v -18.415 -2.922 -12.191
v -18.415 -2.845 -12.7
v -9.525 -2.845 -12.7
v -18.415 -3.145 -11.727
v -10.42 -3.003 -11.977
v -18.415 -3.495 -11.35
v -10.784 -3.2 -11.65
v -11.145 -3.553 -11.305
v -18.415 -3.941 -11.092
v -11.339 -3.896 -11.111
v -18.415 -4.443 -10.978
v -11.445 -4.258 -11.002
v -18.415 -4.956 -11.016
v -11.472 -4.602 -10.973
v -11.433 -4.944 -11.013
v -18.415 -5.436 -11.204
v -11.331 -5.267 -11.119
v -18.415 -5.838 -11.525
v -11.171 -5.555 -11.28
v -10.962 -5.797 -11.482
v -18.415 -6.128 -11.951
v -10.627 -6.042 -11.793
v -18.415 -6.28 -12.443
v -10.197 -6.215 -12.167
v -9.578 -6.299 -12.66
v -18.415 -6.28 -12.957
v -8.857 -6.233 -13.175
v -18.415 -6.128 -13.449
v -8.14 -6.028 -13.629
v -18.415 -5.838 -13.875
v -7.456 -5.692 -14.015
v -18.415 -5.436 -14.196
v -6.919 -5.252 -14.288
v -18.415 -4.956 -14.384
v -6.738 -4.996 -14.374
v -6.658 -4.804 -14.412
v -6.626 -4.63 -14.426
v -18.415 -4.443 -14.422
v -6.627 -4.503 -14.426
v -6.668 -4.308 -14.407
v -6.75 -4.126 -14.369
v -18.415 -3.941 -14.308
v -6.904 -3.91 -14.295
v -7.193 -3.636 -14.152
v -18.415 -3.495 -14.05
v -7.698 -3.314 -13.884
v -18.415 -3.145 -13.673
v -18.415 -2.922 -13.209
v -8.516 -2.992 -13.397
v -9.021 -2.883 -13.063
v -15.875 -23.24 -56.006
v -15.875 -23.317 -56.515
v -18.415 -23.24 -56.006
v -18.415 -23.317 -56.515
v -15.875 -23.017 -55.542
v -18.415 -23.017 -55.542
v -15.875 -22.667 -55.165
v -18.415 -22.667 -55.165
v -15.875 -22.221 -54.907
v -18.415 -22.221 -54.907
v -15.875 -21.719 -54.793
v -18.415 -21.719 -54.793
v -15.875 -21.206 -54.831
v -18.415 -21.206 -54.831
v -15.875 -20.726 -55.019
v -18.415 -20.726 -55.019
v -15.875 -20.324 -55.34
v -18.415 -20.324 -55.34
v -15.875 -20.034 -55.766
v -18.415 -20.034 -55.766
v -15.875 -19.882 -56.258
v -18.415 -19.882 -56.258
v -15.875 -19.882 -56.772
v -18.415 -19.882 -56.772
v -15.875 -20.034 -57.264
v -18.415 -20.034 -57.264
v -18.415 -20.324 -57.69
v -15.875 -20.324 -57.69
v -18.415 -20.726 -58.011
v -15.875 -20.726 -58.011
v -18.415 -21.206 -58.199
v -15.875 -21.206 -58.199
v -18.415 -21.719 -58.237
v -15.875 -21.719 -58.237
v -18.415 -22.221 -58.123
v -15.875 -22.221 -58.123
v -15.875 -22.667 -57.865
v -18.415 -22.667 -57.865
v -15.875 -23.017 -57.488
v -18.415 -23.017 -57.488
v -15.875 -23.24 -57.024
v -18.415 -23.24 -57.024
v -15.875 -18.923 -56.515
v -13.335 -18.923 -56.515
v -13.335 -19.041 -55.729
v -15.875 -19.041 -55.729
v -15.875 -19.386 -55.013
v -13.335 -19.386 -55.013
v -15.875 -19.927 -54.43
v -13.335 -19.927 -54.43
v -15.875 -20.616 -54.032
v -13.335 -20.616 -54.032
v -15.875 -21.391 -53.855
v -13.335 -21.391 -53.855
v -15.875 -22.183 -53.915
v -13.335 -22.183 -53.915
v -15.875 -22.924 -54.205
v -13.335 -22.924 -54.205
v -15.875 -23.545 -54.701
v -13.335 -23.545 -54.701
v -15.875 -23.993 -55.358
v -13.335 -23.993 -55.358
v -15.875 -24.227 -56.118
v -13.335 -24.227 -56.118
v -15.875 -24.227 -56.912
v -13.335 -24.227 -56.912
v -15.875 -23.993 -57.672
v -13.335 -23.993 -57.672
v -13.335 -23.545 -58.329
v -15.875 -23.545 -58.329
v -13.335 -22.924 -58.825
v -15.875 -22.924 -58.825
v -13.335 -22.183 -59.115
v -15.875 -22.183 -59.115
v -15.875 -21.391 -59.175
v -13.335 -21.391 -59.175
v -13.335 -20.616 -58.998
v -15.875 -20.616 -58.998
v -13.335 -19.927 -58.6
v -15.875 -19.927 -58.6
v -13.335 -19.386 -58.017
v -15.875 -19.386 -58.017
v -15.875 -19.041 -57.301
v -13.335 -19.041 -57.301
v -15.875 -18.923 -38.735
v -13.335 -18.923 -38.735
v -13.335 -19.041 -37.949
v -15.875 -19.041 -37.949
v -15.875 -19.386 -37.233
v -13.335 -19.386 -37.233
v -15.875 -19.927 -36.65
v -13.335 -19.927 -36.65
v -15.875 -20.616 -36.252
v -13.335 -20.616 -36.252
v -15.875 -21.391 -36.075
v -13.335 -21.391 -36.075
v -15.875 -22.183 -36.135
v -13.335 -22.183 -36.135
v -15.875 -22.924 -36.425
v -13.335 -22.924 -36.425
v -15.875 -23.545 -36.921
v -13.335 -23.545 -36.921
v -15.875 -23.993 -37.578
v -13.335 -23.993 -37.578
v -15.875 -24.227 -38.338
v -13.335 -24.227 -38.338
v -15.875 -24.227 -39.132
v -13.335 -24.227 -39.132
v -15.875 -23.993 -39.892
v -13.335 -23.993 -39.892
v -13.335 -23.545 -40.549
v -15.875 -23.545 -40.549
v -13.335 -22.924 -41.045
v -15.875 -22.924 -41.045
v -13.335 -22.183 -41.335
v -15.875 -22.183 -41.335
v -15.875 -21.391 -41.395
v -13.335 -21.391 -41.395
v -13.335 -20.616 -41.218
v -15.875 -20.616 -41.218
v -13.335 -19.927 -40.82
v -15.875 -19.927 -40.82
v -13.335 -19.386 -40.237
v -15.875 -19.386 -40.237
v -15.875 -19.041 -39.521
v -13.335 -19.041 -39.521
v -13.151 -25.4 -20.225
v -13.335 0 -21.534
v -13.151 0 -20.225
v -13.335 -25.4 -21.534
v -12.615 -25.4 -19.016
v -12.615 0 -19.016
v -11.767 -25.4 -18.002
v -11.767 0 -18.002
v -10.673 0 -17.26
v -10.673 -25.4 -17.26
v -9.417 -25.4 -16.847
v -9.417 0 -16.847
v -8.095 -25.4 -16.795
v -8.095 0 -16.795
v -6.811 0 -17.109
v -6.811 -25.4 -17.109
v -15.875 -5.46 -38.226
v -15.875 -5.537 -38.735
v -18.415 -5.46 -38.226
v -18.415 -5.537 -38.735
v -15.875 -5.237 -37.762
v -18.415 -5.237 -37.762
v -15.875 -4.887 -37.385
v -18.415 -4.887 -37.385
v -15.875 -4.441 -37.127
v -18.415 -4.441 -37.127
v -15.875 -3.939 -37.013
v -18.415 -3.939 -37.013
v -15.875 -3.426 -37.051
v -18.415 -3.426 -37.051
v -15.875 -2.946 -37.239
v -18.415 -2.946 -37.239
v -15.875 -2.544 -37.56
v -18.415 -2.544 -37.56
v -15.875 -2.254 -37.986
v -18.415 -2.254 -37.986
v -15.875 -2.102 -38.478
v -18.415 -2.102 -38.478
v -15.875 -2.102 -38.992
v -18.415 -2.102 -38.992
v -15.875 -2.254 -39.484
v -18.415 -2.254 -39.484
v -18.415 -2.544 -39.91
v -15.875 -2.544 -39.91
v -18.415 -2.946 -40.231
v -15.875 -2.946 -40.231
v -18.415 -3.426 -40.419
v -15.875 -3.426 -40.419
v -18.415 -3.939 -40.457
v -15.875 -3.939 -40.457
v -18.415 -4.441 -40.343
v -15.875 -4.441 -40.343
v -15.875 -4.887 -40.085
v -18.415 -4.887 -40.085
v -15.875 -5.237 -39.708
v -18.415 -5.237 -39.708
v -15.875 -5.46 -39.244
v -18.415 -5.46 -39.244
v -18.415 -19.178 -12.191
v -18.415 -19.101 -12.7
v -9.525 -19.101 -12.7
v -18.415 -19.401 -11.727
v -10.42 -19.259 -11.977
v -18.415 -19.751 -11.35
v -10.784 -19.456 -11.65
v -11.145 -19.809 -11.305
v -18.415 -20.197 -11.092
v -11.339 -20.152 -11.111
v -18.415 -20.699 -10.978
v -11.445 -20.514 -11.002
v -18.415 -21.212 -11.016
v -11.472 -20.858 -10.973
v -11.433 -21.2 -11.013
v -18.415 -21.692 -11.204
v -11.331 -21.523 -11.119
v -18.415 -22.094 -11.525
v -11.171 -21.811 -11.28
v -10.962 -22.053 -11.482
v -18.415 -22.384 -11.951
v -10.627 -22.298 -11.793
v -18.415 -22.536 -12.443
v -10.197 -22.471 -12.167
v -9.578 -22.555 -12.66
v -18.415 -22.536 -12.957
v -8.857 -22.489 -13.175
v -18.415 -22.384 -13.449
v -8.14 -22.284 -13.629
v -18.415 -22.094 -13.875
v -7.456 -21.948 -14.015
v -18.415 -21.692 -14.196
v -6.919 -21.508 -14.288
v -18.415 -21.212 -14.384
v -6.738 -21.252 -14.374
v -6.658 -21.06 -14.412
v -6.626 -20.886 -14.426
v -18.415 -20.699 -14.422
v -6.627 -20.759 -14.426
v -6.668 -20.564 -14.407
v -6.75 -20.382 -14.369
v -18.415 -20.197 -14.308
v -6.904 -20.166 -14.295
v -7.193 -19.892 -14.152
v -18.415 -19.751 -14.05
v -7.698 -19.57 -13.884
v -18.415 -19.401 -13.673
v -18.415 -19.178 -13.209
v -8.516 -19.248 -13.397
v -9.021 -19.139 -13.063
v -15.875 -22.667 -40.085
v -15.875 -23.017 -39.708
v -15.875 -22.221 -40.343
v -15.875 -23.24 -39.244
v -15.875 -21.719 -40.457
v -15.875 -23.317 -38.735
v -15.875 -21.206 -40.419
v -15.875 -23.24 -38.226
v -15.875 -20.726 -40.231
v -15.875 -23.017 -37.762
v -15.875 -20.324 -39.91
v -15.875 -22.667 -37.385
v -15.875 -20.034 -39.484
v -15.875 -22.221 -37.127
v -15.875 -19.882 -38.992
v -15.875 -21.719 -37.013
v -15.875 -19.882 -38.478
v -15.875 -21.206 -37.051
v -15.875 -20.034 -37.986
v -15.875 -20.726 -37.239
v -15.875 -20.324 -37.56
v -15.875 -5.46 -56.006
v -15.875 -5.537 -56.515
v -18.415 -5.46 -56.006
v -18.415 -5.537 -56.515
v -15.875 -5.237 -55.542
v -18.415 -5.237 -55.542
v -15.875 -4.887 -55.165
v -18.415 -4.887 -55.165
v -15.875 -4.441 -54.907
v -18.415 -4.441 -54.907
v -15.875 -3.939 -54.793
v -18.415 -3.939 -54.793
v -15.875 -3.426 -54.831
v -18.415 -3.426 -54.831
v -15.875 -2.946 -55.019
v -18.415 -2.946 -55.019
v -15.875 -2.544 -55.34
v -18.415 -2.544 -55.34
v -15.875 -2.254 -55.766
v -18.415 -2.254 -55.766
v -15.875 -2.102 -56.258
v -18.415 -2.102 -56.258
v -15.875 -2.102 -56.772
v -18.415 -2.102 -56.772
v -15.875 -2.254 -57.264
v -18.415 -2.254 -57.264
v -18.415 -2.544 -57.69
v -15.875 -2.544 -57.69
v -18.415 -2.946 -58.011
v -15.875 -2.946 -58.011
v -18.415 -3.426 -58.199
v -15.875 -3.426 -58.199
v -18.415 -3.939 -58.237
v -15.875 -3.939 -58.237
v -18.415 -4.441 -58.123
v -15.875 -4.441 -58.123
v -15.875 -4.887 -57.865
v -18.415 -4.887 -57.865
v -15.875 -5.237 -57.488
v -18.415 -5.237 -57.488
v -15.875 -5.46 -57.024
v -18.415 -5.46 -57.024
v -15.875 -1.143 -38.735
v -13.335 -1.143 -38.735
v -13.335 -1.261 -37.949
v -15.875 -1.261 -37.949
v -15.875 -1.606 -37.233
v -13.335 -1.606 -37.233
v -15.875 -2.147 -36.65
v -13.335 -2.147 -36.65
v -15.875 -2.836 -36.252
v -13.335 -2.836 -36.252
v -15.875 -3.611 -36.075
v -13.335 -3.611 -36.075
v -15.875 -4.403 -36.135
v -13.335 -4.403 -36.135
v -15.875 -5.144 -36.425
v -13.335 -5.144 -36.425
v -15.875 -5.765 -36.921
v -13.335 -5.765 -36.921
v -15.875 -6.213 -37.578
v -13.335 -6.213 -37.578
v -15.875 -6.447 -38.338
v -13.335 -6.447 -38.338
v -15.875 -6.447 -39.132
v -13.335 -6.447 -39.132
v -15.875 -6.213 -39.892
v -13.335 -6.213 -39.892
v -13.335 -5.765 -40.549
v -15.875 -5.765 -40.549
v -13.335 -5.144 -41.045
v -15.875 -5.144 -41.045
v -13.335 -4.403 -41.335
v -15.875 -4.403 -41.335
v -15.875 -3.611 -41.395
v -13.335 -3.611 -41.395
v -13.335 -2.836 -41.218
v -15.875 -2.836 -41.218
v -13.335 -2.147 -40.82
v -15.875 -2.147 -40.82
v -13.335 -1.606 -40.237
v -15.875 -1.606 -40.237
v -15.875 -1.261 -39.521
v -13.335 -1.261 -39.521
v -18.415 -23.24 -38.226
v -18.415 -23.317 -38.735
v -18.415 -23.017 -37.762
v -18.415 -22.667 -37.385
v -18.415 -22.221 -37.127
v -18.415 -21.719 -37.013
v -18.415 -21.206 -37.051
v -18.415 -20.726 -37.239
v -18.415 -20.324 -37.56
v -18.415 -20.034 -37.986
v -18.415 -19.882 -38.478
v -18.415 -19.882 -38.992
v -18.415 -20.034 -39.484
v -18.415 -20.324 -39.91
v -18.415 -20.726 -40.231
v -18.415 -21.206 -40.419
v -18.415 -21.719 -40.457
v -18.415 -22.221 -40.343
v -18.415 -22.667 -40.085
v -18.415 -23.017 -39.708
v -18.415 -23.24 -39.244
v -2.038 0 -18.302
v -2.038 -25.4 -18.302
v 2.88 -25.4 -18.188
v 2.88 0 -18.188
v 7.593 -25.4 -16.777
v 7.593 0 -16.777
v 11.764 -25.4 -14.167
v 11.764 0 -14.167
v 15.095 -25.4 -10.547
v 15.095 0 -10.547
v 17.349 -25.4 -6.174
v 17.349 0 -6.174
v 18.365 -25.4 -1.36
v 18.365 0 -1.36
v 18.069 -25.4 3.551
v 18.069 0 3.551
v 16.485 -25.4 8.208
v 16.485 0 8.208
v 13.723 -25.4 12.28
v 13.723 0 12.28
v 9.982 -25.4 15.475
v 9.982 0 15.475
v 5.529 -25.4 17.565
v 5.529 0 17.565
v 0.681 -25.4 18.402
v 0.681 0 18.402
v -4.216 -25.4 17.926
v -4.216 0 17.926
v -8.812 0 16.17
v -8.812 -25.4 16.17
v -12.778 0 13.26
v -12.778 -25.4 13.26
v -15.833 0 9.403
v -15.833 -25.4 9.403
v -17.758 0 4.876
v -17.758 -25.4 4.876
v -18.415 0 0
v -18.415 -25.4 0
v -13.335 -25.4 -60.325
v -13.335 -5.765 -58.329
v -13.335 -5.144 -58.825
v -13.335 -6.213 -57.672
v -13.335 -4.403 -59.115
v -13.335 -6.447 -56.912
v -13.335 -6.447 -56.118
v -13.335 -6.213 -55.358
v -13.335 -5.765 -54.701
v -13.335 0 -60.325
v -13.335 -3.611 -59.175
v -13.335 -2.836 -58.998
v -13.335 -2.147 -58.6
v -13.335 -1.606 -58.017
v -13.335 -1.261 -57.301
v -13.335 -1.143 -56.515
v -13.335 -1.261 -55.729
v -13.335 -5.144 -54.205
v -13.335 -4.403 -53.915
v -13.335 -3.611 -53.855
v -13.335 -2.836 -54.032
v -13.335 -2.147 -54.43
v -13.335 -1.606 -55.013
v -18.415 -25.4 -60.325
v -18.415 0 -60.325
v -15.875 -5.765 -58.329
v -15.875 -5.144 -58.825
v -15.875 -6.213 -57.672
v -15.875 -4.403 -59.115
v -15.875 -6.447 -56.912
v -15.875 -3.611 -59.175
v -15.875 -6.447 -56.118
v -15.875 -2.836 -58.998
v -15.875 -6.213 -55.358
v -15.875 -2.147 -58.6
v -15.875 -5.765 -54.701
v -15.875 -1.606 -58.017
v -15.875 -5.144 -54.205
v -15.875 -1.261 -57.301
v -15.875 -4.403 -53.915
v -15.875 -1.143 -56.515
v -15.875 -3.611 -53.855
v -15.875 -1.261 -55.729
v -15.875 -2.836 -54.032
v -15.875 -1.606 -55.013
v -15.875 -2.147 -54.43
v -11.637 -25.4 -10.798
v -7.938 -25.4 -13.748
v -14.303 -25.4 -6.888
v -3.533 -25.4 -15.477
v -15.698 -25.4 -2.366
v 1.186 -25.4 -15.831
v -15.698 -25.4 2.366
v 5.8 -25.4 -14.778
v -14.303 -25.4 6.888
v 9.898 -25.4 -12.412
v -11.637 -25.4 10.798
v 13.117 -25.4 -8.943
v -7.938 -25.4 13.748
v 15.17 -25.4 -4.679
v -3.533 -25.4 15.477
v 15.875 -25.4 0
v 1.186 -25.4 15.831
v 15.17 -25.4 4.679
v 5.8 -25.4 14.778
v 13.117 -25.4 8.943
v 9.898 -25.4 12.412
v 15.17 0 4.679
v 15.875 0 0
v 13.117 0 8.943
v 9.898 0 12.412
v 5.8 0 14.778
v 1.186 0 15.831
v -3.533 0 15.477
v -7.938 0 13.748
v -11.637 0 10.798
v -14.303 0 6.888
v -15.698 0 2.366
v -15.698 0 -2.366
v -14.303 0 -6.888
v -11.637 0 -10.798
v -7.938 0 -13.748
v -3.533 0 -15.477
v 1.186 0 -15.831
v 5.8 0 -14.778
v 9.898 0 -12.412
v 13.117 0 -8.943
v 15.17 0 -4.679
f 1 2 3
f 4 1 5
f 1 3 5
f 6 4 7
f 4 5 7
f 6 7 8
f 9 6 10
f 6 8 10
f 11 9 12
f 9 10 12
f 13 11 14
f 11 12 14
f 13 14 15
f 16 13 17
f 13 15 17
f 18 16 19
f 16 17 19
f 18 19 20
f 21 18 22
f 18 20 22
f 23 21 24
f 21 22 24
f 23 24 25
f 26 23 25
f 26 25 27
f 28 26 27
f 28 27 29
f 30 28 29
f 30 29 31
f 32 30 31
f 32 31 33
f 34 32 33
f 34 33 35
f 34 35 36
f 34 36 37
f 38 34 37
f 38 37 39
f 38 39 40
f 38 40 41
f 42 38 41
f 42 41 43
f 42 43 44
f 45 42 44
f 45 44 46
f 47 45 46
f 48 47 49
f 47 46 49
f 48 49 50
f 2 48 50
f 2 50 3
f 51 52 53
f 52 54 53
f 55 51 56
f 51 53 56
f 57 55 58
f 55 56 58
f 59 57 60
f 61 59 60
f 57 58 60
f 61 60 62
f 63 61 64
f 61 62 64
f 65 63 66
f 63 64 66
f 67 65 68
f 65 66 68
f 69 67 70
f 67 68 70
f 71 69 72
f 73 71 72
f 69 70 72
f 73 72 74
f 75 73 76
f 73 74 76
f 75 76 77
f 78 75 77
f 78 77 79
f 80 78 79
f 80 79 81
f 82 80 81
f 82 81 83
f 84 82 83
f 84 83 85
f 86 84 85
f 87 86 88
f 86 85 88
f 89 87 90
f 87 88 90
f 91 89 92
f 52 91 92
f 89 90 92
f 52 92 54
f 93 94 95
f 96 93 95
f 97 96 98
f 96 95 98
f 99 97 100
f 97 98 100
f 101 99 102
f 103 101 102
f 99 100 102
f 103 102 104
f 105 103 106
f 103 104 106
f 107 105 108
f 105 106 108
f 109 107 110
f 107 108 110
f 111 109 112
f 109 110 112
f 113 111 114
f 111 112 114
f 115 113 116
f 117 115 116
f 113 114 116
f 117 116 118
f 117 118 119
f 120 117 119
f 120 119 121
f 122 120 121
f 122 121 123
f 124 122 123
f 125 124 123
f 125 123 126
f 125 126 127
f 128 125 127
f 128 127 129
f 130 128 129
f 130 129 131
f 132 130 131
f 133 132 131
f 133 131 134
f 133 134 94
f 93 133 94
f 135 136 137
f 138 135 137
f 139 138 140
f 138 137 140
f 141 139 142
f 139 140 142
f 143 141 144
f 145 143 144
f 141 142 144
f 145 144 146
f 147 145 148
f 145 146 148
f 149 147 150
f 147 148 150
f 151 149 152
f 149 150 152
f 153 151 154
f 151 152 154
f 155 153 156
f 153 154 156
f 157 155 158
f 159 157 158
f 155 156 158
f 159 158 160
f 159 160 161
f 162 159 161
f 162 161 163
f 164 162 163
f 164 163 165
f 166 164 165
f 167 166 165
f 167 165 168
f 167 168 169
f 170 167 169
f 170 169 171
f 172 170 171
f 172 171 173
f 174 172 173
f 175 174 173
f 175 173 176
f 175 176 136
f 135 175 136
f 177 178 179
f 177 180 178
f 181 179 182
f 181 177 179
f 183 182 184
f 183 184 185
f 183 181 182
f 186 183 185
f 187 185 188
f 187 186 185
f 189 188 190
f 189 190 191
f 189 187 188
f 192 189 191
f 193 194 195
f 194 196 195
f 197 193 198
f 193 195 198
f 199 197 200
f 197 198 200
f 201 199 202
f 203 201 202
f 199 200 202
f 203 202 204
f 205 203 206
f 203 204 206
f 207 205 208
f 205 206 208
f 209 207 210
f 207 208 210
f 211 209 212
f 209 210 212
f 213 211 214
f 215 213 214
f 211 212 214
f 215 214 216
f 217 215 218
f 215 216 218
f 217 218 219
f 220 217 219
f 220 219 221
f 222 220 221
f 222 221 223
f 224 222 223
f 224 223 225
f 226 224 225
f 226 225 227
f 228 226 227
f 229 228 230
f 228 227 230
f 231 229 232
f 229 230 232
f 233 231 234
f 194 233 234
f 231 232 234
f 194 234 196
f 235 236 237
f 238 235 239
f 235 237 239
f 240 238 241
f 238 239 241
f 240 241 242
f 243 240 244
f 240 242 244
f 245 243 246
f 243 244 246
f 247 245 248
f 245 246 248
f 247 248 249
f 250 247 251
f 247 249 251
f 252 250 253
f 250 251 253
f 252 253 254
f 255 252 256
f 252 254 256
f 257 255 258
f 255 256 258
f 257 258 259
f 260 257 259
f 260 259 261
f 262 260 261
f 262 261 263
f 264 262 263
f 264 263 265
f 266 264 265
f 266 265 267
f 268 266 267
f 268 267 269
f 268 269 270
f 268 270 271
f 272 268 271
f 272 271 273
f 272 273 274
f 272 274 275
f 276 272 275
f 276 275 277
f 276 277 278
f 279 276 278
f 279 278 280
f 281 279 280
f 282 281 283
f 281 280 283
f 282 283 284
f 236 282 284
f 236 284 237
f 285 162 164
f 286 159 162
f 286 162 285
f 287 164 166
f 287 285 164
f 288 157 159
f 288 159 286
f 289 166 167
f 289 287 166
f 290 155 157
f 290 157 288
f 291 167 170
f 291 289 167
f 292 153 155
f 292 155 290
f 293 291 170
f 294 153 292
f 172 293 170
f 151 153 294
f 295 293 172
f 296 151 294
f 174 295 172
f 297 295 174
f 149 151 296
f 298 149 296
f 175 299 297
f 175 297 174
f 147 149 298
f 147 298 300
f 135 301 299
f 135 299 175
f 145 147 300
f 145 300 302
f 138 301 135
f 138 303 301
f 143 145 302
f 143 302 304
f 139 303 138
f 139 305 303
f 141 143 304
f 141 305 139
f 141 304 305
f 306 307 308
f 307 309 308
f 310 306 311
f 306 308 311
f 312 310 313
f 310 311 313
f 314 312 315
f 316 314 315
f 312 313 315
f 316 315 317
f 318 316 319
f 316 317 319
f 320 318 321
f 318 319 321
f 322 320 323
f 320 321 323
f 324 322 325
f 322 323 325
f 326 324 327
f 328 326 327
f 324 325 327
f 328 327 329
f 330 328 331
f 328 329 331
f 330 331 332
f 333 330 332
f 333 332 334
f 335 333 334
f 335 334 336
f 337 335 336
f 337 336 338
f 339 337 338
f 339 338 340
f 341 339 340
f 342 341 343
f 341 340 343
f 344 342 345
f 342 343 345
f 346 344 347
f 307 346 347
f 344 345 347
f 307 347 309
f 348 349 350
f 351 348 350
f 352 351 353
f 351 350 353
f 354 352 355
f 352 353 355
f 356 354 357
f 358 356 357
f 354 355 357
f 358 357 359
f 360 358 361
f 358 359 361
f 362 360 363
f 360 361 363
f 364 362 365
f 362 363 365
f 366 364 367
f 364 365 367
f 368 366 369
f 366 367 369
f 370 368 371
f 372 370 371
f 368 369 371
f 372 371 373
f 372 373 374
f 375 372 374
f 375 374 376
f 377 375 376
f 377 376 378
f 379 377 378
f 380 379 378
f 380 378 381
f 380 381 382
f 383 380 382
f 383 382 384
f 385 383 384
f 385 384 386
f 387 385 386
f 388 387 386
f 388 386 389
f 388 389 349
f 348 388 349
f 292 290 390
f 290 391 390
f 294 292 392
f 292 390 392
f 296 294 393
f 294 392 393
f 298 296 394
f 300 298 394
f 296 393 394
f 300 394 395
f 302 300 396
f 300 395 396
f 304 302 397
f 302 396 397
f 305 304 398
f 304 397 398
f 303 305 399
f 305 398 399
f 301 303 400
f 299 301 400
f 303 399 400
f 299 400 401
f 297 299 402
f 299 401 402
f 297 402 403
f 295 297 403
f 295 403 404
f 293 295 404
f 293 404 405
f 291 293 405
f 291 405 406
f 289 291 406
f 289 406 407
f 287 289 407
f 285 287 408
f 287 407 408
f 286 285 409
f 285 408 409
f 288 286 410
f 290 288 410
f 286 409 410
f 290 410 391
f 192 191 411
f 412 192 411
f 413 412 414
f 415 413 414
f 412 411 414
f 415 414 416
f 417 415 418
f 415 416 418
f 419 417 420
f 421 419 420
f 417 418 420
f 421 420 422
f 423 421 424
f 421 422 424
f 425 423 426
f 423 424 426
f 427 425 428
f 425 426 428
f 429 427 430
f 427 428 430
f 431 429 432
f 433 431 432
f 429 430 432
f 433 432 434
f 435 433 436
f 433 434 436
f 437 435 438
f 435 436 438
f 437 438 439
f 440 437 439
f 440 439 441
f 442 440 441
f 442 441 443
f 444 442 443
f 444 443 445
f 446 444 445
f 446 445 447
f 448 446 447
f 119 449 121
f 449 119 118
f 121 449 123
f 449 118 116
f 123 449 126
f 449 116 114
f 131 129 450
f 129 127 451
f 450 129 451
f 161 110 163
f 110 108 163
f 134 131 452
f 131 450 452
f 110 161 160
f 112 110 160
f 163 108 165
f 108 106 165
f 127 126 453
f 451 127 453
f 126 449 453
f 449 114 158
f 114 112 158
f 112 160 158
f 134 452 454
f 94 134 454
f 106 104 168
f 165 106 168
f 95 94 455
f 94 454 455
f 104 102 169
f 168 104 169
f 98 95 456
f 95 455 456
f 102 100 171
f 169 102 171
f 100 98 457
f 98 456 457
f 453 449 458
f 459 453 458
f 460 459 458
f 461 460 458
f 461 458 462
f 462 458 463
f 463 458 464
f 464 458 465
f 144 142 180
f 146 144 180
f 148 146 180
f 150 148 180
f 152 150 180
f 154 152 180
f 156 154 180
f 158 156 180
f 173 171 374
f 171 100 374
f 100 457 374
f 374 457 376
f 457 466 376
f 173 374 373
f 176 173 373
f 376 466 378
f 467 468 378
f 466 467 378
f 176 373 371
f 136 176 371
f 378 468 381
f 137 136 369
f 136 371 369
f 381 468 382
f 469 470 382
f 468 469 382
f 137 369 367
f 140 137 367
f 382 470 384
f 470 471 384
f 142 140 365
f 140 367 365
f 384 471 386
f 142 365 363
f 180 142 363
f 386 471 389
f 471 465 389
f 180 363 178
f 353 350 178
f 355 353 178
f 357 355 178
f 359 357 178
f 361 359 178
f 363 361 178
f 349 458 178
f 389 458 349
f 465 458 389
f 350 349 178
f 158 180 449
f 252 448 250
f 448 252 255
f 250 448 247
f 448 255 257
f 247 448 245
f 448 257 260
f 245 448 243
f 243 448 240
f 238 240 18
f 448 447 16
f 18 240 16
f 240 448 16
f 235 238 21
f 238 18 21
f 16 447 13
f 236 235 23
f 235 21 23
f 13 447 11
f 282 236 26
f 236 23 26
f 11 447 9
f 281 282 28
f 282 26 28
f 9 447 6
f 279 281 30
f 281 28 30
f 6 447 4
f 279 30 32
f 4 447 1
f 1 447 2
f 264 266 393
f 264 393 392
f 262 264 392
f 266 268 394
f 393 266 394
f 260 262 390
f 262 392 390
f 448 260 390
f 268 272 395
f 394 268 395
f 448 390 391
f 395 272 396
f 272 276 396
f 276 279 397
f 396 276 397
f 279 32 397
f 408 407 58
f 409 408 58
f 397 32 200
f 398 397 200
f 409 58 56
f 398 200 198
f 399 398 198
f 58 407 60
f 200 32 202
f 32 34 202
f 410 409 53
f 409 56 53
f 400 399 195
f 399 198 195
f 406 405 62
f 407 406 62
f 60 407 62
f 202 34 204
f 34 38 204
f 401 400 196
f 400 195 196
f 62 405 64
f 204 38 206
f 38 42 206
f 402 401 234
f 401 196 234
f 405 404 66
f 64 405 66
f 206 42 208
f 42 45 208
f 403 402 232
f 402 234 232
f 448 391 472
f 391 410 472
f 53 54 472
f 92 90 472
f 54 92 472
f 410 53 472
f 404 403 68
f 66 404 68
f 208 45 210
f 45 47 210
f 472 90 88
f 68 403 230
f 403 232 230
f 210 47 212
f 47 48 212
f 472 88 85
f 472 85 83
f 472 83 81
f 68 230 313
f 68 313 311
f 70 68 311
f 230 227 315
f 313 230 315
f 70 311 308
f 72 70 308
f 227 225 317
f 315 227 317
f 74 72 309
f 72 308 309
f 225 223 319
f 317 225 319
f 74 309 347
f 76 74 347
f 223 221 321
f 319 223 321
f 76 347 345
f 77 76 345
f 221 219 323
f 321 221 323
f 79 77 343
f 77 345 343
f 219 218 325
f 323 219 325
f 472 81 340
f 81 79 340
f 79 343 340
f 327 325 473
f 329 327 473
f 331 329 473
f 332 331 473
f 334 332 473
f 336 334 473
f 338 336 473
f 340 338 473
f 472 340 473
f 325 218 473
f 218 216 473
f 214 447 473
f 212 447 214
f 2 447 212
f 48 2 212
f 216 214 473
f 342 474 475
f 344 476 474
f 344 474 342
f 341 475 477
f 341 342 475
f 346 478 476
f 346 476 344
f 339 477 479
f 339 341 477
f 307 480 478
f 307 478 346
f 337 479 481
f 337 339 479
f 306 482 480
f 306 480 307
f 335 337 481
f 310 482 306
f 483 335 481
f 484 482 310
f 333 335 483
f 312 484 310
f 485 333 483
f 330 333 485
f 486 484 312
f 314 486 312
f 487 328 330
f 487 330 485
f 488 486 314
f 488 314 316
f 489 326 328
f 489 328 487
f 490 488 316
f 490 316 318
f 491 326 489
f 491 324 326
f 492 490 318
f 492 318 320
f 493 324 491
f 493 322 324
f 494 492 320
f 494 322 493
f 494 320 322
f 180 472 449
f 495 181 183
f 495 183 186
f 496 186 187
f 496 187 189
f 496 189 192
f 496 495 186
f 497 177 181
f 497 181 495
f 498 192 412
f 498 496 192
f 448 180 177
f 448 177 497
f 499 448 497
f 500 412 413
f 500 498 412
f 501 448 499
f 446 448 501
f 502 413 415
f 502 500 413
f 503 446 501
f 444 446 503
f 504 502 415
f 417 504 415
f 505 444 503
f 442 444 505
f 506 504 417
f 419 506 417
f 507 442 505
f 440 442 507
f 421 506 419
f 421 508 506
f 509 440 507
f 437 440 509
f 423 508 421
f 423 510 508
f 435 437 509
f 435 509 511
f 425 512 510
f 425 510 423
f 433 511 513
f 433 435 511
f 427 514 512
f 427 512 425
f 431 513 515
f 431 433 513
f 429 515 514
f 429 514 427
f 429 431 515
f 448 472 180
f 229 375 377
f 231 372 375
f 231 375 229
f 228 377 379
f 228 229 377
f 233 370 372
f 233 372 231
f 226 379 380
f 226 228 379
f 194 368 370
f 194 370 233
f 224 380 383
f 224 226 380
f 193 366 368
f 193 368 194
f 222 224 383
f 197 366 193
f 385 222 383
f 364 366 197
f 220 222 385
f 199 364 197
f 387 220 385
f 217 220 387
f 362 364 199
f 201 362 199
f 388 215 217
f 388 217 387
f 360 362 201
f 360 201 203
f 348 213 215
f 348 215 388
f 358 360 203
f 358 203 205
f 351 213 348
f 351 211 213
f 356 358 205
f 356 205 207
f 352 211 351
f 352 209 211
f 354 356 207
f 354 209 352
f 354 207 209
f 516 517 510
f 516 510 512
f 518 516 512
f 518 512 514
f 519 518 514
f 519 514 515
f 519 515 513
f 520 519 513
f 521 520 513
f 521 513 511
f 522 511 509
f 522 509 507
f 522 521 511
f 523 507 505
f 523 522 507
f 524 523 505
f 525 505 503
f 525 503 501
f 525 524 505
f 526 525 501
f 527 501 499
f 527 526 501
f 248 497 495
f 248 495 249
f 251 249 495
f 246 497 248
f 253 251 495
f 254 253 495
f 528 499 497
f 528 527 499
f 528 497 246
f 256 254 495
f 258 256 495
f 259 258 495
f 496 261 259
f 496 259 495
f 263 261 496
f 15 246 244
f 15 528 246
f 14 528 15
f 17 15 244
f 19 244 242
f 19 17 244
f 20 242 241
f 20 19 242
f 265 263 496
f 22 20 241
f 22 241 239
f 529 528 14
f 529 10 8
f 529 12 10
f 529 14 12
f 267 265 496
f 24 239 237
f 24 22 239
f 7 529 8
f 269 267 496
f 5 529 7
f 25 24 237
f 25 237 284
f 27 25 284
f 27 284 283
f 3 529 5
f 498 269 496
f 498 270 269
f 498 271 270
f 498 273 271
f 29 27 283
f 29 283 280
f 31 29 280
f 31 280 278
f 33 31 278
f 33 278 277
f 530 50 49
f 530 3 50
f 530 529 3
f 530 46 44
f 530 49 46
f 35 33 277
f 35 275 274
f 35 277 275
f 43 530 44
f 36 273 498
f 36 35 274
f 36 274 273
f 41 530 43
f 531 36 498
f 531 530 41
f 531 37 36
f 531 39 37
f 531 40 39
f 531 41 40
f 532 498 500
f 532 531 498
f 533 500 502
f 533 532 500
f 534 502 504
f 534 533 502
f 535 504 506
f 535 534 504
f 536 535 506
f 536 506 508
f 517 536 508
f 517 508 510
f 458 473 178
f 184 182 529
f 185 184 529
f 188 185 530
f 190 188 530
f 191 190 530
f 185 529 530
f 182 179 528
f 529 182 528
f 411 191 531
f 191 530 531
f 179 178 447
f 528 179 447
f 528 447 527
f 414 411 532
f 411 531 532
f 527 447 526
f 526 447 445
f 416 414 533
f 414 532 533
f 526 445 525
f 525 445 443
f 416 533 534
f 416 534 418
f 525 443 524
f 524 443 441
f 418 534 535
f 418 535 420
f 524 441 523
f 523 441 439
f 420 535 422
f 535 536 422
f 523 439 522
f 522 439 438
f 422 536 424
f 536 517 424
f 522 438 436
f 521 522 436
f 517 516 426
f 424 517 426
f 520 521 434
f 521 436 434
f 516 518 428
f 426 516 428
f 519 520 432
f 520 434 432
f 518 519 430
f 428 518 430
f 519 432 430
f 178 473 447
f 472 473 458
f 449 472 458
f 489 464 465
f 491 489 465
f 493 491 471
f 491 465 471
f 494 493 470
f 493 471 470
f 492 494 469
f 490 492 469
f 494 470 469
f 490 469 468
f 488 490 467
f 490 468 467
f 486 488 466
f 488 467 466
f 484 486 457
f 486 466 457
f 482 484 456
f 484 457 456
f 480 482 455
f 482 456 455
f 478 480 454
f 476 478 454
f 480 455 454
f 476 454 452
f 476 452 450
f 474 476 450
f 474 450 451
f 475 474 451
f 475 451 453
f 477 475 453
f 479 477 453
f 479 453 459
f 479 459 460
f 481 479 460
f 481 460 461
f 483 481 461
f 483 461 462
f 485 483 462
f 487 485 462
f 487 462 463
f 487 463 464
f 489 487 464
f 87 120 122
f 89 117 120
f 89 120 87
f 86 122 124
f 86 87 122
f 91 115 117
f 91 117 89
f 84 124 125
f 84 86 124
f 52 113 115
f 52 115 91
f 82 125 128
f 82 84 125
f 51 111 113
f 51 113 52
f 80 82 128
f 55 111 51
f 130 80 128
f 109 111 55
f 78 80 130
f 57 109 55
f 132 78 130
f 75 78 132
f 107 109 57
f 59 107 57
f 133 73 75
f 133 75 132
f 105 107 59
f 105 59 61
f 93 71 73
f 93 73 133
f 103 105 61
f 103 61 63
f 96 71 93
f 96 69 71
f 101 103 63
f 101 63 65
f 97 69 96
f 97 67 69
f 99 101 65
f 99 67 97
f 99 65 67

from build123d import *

# Parameters (mm, degrees)
F0_R           = 15.875
F1_DEPTH       = 25.4
F2_R           = 4.7625
F4_D           = 3.4544
F4_DEPTH       = 12.7
F6_D           = 3.4544
F6_CBORE_D     = 5.334
F6_CBORE_DEPTH = 2.54


with BuildPart() as f1:
    # F0 (on Front) → F1 (new body)
    with BuildSketch(Plane.XZ):
        with BuildLine():
            Line((-13.335, -60.325), (-13.335, -12.7))
            ThreePointArc((-13.335, -12.7), (17.097898, 6.839159), (-18.415, 0))
            Line((-18.415, 0), (-18.415, -60.325))
            Line((-18.415, -60.325), (-13.335, -60.325))
        make_face()
        Circle(F0_R, mode=Mode.SUBTRACT)
    extrude(amount=F1_DEPTH)

    # F2
    f2_edges = [f1.edges().sort_by_distance(p)[0] for p in [
        (-13.335, -12.7, -12.7),
    ]]
    fillet(f2_edges, radius=F2_R)

    # F4
    with Locations(Plane(origin=(-18.415, 0, 0), x_dir=(0, -1, 0), z_dir=(-1, 0, 0))):
        with Locations((4.572, -12.7), (20.828, -12.7)):
            Hole(F4_D / 2, depth=F4_DEPTH)

    # F6 (through all)
    with Locations(Plane.YZ.offset(-13.335)):
        with Locations((-21.59, -38.735), (-3.81, -38.735), (-21.59, -56.515), (-3.81, -56.515)):
            CounterBoreHole(F6_D / 2, F6_CBORE_D / 2, F6_CBORE_DEPTH)


solid = f1.part
